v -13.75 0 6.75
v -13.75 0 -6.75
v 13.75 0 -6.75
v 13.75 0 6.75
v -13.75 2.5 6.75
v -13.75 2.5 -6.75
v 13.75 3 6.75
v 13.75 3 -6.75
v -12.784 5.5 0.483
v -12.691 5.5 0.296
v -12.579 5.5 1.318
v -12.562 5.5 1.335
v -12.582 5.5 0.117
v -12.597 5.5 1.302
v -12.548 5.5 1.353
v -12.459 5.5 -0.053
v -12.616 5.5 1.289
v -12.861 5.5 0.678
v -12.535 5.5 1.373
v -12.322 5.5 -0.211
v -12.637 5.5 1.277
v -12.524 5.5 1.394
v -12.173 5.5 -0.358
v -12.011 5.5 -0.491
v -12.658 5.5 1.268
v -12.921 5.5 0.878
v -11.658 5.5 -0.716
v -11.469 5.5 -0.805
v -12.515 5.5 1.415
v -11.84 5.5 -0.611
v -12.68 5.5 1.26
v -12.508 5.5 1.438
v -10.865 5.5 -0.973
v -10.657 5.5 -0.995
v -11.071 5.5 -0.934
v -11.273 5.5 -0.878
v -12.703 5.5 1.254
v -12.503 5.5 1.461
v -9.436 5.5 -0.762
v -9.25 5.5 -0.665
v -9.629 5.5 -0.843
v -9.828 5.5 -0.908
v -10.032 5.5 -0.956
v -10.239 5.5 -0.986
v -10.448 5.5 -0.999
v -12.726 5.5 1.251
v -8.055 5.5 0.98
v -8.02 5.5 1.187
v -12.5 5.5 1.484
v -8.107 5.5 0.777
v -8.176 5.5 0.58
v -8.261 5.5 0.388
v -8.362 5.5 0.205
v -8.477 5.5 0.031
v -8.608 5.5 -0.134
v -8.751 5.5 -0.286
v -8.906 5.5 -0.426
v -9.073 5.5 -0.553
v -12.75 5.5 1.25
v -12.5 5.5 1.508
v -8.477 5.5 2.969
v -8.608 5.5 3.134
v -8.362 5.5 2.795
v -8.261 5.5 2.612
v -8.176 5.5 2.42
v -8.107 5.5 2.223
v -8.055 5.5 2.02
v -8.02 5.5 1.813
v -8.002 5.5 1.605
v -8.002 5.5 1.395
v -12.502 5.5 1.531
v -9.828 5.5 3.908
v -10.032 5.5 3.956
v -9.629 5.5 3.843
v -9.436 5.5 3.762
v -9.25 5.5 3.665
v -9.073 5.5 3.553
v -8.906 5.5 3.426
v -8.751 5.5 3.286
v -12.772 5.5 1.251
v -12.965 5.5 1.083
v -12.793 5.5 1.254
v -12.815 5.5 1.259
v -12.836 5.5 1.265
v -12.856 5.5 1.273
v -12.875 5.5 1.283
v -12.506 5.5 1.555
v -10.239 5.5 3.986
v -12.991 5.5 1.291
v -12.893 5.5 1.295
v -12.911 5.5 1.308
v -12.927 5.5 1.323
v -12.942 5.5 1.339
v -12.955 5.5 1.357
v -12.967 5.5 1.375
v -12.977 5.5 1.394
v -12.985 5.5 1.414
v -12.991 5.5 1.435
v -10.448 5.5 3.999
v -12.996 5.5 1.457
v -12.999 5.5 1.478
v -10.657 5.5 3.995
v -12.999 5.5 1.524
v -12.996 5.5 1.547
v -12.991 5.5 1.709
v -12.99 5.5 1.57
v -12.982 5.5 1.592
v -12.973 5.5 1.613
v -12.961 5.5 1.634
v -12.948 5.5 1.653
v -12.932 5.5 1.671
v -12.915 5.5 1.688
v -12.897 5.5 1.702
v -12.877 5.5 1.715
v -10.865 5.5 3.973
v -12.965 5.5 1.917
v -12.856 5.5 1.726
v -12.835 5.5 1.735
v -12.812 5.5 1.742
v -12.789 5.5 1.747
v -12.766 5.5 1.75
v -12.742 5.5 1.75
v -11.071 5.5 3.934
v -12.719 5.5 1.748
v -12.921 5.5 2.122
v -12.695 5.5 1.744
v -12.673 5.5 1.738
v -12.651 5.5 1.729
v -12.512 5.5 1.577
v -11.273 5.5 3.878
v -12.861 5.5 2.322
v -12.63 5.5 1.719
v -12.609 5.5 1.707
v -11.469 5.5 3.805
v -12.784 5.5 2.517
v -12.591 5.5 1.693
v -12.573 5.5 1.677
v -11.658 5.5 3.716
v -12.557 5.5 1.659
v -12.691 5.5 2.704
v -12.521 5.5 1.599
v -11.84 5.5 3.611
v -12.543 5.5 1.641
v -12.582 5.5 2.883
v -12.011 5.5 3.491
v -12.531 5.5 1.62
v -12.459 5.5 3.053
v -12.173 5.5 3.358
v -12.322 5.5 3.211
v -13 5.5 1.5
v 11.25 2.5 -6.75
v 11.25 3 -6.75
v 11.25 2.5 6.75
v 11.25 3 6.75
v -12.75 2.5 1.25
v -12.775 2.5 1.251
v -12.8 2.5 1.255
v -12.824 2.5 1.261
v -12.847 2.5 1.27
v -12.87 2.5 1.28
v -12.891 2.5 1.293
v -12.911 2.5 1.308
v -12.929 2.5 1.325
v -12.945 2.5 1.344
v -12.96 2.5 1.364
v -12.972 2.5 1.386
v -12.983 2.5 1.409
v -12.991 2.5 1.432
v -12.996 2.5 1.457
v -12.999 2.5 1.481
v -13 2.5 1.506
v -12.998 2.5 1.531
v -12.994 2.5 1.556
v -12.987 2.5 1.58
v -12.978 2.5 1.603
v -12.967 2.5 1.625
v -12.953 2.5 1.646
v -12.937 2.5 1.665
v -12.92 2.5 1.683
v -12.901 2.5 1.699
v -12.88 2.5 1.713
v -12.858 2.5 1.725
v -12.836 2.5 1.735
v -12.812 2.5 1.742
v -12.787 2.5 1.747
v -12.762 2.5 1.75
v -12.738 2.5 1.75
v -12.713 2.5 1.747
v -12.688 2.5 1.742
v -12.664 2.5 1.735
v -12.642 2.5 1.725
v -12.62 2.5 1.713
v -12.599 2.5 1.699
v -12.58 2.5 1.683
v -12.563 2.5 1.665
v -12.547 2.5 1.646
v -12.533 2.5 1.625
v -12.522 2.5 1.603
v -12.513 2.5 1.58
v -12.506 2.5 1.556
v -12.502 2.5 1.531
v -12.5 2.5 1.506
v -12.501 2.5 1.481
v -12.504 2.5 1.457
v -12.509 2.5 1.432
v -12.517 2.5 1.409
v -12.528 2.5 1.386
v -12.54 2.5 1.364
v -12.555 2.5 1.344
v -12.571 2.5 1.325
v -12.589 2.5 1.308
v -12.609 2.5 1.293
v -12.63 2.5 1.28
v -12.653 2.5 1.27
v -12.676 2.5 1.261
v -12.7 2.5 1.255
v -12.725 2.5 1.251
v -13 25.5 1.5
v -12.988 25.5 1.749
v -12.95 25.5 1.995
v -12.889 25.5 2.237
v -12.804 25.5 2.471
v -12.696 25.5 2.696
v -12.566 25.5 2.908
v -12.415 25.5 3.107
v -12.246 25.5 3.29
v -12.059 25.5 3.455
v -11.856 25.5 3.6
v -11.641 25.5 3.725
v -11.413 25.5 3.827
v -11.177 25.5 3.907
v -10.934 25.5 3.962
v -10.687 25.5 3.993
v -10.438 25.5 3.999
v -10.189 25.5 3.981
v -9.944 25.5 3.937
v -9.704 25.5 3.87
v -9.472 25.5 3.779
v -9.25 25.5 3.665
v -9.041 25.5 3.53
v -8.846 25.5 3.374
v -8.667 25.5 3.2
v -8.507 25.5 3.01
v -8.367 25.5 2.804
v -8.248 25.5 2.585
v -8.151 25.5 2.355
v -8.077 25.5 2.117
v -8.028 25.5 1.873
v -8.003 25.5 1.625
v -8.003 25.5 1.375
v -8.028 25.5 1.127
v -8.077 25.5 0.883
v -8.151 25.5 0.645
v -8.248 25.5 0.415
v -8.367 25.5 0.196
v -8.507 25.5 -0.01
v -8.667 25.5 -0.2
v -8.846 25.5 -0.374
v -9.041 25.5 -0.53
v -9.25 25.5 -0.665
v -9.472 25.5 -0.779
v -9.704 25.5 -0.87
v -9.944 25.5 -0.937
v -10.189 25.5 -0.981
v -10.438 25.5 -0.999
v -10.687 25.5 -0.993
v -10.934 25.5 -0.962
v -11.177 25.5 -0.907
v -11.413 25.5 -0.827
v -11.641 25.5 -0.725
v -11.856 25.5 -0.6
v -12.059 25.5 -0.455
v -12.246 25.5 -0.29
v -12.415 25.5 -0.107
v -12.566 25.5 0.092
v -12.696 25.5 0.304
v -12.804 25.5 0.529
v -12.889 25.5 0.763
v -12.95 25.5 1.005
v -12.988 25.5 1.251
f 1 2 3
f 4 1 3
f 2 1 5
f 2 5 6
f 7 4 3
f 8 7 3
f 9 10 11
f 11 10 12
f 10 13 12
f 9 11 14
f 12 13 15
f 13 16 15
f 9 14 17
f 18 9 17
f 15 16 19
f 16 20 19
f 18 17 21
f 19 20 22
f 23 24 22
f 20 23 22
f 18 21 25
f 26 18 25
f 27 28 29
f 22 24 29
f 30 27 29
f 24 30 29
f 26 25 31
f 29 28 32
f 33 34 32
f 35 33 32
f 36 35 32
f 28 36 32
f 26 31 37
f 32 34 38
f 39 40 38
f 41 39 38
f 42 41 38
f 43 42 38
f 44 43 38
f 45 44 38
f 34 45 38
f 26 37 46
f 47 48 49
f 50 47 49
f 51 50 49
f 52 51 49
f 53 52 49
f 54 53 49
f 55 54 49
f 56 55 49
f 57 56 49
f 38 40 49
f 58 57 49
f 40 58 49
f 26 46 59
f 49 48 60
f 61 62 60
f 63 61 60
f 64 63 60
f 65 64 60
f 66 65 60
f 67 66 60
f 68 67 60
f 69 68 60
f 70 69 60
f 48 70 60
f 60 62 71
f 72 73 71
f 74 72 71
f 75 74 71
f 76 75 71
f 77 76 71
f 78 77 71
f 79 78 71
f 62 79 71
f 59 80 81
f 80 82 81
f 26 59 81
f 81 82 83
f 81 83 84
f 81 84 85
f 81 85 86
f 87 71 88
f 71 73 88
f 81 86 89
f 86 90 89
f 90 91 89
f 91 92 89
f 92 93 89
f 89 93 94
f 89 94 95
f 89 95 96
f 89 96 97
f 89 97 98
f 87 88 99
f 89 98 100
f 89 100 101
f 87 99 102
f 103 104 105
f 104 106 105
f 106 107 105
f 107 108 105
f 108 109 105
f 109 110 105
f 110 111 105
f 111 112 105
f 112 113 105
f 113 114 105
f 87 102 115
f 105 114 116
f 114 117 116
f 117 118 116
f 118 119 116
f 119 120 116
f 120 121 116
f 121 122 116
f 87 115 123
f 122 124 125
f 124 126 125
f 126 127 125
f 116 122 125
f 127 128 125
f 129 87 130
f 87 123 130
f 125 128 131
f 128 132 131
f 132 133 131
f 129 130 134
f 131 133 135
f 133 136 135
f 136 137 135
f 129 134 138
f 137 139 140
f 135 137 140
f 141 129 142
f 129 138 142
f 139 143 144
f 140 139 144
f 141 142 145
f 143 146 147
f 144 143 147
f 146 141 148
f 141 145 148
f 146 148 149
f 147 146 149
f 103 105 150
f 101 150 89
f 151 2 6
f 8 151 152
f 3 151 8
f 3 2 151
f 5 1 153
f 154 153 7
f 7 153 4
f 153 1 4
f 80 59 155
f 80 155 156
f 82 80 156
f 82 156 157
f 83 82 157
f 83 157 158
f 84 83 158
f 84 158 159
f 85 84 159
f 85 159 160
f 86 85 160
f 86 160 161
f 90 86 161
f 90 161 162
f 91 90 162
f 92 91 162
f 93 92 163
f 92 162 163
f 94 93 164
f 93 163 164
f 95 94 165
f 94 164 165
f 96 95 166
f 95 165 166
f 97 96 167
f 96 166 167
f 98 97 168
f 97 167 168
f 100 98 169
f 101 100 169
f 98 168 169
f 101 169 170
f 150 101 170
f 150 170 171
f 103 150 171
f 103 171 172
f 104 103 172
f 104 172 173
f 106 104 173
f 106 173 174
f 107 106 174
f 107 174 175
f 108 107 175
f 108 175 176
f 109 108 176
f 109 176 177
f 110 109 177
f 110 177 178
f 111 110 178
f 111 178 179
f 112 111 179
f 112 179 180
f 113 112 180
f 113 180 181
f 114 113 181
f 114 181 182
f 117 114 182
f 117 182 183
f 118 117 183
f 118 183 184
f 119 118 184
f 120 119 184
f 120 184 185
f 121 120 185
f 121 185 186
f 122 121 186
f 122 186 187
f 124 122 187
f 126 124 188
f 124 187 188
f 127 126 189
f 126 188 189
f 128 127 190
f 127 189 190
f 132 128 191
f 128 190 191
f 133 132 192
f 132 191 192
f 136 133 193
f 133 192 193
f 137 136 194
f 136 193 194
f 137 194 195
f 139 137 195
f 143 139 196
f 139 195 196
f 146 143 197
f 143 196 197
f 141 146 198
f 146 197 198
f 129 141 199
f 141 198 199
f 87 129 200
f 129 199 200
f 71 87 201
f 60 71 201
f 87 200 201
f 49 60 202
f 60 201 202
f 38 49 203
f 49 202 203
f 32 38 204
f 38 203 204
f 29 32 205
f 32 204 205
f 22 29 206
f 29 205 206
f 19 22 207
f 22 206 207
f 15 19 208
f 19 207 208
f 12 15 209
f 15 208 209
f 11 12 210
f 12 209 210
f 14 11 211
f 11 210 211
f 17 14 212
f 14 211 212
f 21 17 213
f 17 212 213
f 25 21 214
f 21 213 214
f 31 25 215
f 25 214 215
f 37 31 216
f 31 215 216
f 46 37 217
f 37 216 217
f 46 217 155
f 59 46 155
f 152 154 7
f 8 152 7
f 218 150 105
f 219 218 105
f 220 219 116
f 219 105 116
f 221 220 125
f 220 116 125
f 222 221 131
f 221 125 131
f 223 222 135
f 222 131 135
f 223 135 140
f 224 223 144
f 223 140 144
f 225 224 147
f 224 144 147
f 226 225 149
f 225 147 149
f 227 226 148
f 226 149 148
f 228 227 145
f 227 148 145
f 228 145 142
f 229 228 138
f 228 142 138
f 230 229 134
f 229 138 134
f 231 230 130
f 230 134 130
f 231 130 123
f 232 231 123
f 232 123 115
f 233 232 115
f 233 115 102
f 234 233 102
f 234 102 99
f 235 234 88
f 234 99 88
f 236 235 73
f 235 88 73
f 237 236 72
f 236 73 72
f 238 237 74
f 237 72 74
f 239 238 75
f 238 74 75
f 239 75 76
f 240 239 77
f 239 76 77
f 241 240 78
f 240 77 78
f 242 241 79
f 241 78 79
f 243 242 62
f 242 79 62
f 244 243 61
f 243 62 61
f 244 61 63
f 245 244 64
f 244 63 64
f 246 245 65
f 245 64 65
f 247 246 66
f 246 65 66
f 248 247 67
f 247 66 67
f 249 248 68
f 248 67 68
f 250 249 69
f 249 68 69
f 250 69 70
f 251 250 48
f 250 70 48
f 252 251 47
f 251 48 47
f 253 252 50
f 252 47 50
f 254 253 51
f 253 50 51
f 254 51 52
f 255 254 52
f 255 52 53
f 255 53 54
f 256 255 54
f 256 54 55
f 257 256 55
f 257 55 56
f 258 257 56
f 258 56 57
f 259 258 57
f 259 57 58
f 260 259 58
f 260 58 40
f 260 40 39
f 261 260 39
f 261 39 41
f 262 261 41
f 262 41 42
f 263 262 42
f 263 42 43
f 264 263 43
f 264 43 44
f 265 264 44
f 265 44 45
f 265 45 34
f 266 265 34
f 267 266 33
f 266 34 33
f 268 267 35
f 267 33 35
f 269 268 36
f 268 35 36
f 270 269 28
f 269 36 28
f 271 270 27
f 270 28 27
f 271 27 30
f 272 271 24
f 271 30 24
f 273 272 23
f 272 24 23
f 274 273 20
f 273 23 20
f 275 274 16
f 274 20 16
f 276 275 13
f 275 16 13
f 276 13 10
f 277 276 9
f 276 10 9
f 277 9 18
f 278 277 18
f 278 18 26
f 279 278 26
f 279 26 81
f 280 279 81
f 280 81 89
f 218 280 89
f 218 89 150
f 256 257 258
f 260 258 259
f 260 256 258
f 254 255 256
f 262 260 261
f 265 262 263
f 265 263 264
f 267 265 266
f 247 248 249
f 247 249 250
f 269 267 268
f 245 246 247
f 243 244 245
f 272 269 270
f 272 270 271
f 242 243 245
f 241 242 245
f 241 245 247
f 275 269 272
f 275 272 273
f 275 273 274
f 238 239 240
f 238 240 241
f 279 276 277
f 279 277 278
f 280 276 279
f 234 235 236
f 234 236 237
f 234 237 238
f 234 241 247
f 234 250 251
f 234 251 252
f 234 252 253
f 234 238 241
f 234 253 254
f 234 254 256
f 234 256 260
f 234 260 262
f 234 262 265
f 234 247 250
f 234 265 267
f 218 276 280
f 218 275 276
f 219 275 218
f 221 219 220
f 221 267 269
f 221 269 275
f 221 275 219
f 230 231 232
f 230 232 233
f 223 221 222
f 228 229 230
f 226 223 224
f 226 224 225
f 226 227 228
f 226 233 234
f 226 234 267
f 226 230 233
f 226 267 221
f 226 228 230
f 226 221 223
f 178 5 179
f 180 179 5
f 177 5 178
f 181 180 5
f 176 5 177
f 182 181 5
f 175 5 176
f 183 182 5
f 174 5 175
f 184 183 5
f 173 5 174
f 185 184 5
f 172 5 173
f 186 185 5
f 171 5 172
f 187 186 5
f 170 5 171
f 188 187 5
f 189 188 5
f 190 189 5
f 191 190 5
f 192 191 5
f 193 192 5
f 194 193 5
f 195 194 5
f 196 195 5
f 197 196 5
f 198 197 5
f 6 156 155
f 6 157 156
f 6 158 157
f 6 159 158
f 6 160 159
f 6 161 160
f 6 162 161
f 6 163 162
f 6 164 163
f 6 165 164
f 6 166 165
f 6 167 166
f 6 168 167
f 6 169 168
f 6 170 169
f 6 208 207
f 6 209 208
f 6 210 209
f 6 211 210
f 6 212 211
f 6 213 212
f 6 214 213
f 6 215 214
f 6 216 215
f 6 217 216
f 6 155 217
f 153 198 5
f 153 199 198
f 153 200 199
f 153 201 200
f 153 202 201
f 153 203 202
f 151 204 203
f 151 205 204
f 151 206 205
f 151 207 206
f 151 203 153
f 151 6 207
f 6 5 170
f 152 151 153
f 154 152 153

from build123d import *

# Parameters (mm, degrees)
SKETCH_1_W      = 27.5
SKETCH_1_H      = 13.5
EXTRUDE_1_DEPTH = 2.5
SKETCH_2_W      = 2.5
SKETCH_2_H      = 13.5
EXTRUDE_2_DEPTH = 3
SKETCH_5_R      = 0.25
EXTRUDE_6_DEPTH = 3
SKETCH_6_R      = 2.5
EXTRUDE_7_DEPTH = 20


with BuildPart() as part:
    # Эскиз1 → Бобышка-Вытянуть1 (new body)
    with BuildSketch(Plane(origin=(0, 0, 0), x_dir=(1, 0, 0), z_dir=(0, 1, 0))):
        Rectangle(SKETCH_1_W, SKETCH_1_H)
    extrude(amount=EXTRUDE_1_DEPTH)

    # Эскиз2 → Бобышка-Вытянуть2 (add)
    with BuildSketch(Plane.XZ):
        with Locations((12.5, 0)):
            Rectangle(SKETCH_2_W, SKETCH_2_H)
    extrude(amount=-EXTRUDE_2_DEPTH)

    # Эскиз5 → Бобышка-Вытянуть6 (add)
    with BuildSketch(Plane(origin=(0, 2.5, 0), x_dir=(1, 0, 0), z_dir=(0, 1, 0))):
        with Locations(Location((-12.75, -1.5, 0), (0, 0, 90))):
            Circle(SKETCH_5_R)
    extrude(amount=EXTRUDE_6_DEPTH)

    # Эскиз6 → Бобышка-Вытянуть7 (add)
    with BuildSketch(Plane(origin=(0, 5.5, 0), x_dir=(1, 0, 0), z_dir=(0, 1, 0))):
        with Locations(Location((-10.5, -1.5, 0), (0, 0, 180))):
            Circle(SKETCH_6_R)
    extrude(amount=EXTRUDE_7_DEPTH)


solid = part.part
